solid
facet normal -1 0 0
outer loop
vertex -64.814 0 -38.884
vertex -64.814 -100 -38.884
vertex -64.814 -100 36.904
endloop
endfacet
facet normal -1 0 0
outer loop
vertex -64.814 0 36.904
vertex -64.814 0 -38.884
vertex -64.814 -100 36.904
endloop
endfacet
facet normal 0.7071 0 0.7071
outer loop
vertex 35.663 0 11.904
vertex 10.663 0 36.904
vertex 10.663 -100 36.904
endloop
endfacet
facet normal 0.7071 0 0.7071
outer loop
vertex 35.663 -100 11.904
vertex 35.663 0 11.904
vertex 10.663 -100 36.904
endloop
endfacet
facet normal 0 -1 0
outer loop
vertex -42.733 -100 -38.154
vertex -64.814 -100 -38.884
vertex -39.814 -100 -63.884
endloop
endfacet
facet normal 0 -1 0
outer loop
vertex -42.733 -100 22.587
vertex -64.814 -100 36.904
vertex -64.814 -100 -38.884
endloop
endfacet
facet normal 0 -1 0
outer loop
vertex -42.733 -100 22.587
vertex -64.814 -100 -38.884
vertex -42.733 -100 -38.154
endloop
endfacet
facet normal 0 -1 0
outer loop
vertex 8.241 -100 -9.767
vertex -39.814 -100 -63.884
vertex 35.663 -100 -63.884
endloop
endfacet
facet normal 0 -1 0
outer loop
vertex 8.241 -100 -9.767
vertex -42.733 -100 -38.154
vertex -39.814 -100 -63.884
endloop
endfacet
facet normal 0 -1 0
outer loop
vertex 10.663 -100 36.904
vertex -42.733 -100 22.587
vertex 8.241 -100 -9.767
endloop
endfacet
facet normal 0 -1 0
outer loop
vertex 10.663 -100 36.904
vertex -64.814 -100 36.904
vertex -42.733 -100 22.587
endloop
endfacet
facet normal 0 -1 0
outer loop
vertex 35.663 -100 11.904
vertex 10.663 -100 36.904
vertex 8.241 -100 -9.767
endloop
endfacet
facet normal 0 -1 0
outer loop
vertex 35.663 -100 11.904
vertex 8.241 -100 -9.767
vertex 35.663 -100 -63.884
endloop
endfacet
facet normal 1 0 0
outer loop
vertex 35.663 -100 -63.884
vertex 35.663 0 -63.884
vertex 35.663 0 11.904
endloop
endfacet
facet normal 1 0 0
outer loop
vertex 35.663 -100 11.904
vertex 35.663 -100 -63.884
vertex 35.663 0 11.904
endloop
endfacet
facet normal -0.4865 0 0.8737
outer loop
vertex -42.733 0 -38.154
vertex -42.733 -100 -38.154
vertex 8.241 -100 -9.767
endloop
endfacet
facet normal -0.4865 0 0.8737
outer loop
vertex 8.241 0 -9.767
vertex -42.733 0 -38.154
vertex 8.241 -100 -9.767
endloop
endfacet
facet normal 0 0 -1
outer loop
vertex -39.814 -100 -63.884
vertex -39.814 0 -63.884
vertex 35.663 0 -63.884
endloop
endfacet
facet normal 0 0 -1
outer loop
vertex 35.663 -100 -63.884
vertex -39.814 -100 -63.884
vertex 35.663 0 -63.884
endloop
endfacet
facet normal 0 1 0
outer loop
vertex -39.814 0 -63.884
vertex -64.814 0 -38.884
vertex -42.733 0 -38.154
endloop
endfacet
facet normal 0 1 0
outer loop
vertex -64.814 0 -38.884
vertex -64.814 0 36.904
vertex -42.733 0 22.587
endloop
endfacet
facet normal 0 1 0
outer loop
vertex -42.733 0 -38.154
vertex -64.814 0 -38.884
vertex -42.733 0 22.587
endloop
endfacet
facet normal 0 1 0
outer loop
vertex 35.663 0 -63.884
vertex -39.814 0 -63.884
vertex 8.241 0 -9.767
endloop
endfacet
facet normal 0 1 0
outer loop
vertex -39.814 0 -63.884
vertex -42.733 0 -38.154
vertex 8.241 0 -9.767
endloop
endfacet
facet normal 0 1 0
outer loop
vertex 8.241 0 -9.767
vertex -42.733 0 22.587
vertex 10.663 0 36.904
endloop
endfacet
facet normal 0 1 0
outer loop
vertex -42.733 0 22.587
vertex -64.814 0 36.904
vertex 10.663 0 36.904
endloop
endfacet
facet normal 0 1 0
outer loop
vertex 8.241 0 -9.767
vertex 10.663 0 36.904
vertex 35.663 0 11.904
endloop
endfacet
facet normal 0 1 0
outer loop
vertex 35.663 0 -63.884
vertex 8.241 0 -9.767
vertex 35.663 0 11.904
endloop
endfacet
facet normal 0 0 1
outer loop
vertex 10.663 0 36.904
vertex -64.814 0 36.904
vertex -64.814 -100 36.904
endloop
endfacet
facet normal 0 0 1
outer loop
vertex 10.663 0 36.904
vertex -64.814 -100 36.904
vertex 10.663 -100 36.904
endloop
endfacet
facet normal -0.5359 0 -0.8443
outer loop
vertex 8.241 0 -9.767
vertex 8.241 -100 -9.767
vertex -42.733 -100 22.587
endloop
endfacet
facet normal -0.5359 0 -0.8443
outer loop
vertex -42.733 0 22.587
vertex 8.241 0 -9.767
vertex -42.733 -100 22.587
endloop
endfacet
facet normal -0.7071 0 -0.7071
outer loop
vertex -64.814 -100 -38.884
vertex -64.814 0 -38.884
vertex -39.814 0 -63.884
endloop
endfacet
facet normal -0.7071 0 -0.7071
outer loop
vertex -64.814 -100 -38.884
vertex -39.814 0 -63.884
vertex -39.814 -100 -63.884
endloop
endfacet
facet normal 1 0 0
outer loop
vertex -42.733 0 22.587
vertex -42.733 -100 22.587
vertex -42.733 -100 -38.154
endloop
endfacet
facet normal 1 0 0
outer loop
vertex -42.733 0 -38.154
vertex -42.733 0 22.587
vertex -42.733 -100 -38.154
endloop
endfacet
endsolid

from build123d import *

# Parameters (mm, degrees)
F0_W     = 100.477673
F0_H     = 100.787793
F1_DEPTH = 100
F2_SIZE  = 25
F3_SIZE  = 25
F5_DEPTH = 100


with BuildPart() as f1:
    # F0 (on Front) → F1 (new body)
    with BuildSketch(Plane.XZ):
        with Locations((-14.575462, -13.490057)):
            Rectangle(F0_W, F0_H)
    extrude(amount=F1_DEPTH)

    # F2
    f2_edges = [f1.edges().sort_by_distance(p)[0] for p in [
        (35.663374, -50, 36.90384),
    ]]
    chamfer(f2_edges, length=F2_SIZE)

    # F3
    f3_edges = [f1.edges().sort_by_distance(p)[0] for p in [
        (-64.814299, -50, -63.883953),
    ]]
    chamfer(f3_edges, length=F3_SIZE)

    # F4 (on face) → F5 (cut)
    with BuildSketch(Plane.XZ.offset(100)):
        Polygon((-42.732559, 22.58721), (-42.732559, -38.154069), (8.241279, -9.767442), align=None)
    extrude(amount=-F5_DEPTH, mode=Mode.SUBTRACT)


solid = f1.part
